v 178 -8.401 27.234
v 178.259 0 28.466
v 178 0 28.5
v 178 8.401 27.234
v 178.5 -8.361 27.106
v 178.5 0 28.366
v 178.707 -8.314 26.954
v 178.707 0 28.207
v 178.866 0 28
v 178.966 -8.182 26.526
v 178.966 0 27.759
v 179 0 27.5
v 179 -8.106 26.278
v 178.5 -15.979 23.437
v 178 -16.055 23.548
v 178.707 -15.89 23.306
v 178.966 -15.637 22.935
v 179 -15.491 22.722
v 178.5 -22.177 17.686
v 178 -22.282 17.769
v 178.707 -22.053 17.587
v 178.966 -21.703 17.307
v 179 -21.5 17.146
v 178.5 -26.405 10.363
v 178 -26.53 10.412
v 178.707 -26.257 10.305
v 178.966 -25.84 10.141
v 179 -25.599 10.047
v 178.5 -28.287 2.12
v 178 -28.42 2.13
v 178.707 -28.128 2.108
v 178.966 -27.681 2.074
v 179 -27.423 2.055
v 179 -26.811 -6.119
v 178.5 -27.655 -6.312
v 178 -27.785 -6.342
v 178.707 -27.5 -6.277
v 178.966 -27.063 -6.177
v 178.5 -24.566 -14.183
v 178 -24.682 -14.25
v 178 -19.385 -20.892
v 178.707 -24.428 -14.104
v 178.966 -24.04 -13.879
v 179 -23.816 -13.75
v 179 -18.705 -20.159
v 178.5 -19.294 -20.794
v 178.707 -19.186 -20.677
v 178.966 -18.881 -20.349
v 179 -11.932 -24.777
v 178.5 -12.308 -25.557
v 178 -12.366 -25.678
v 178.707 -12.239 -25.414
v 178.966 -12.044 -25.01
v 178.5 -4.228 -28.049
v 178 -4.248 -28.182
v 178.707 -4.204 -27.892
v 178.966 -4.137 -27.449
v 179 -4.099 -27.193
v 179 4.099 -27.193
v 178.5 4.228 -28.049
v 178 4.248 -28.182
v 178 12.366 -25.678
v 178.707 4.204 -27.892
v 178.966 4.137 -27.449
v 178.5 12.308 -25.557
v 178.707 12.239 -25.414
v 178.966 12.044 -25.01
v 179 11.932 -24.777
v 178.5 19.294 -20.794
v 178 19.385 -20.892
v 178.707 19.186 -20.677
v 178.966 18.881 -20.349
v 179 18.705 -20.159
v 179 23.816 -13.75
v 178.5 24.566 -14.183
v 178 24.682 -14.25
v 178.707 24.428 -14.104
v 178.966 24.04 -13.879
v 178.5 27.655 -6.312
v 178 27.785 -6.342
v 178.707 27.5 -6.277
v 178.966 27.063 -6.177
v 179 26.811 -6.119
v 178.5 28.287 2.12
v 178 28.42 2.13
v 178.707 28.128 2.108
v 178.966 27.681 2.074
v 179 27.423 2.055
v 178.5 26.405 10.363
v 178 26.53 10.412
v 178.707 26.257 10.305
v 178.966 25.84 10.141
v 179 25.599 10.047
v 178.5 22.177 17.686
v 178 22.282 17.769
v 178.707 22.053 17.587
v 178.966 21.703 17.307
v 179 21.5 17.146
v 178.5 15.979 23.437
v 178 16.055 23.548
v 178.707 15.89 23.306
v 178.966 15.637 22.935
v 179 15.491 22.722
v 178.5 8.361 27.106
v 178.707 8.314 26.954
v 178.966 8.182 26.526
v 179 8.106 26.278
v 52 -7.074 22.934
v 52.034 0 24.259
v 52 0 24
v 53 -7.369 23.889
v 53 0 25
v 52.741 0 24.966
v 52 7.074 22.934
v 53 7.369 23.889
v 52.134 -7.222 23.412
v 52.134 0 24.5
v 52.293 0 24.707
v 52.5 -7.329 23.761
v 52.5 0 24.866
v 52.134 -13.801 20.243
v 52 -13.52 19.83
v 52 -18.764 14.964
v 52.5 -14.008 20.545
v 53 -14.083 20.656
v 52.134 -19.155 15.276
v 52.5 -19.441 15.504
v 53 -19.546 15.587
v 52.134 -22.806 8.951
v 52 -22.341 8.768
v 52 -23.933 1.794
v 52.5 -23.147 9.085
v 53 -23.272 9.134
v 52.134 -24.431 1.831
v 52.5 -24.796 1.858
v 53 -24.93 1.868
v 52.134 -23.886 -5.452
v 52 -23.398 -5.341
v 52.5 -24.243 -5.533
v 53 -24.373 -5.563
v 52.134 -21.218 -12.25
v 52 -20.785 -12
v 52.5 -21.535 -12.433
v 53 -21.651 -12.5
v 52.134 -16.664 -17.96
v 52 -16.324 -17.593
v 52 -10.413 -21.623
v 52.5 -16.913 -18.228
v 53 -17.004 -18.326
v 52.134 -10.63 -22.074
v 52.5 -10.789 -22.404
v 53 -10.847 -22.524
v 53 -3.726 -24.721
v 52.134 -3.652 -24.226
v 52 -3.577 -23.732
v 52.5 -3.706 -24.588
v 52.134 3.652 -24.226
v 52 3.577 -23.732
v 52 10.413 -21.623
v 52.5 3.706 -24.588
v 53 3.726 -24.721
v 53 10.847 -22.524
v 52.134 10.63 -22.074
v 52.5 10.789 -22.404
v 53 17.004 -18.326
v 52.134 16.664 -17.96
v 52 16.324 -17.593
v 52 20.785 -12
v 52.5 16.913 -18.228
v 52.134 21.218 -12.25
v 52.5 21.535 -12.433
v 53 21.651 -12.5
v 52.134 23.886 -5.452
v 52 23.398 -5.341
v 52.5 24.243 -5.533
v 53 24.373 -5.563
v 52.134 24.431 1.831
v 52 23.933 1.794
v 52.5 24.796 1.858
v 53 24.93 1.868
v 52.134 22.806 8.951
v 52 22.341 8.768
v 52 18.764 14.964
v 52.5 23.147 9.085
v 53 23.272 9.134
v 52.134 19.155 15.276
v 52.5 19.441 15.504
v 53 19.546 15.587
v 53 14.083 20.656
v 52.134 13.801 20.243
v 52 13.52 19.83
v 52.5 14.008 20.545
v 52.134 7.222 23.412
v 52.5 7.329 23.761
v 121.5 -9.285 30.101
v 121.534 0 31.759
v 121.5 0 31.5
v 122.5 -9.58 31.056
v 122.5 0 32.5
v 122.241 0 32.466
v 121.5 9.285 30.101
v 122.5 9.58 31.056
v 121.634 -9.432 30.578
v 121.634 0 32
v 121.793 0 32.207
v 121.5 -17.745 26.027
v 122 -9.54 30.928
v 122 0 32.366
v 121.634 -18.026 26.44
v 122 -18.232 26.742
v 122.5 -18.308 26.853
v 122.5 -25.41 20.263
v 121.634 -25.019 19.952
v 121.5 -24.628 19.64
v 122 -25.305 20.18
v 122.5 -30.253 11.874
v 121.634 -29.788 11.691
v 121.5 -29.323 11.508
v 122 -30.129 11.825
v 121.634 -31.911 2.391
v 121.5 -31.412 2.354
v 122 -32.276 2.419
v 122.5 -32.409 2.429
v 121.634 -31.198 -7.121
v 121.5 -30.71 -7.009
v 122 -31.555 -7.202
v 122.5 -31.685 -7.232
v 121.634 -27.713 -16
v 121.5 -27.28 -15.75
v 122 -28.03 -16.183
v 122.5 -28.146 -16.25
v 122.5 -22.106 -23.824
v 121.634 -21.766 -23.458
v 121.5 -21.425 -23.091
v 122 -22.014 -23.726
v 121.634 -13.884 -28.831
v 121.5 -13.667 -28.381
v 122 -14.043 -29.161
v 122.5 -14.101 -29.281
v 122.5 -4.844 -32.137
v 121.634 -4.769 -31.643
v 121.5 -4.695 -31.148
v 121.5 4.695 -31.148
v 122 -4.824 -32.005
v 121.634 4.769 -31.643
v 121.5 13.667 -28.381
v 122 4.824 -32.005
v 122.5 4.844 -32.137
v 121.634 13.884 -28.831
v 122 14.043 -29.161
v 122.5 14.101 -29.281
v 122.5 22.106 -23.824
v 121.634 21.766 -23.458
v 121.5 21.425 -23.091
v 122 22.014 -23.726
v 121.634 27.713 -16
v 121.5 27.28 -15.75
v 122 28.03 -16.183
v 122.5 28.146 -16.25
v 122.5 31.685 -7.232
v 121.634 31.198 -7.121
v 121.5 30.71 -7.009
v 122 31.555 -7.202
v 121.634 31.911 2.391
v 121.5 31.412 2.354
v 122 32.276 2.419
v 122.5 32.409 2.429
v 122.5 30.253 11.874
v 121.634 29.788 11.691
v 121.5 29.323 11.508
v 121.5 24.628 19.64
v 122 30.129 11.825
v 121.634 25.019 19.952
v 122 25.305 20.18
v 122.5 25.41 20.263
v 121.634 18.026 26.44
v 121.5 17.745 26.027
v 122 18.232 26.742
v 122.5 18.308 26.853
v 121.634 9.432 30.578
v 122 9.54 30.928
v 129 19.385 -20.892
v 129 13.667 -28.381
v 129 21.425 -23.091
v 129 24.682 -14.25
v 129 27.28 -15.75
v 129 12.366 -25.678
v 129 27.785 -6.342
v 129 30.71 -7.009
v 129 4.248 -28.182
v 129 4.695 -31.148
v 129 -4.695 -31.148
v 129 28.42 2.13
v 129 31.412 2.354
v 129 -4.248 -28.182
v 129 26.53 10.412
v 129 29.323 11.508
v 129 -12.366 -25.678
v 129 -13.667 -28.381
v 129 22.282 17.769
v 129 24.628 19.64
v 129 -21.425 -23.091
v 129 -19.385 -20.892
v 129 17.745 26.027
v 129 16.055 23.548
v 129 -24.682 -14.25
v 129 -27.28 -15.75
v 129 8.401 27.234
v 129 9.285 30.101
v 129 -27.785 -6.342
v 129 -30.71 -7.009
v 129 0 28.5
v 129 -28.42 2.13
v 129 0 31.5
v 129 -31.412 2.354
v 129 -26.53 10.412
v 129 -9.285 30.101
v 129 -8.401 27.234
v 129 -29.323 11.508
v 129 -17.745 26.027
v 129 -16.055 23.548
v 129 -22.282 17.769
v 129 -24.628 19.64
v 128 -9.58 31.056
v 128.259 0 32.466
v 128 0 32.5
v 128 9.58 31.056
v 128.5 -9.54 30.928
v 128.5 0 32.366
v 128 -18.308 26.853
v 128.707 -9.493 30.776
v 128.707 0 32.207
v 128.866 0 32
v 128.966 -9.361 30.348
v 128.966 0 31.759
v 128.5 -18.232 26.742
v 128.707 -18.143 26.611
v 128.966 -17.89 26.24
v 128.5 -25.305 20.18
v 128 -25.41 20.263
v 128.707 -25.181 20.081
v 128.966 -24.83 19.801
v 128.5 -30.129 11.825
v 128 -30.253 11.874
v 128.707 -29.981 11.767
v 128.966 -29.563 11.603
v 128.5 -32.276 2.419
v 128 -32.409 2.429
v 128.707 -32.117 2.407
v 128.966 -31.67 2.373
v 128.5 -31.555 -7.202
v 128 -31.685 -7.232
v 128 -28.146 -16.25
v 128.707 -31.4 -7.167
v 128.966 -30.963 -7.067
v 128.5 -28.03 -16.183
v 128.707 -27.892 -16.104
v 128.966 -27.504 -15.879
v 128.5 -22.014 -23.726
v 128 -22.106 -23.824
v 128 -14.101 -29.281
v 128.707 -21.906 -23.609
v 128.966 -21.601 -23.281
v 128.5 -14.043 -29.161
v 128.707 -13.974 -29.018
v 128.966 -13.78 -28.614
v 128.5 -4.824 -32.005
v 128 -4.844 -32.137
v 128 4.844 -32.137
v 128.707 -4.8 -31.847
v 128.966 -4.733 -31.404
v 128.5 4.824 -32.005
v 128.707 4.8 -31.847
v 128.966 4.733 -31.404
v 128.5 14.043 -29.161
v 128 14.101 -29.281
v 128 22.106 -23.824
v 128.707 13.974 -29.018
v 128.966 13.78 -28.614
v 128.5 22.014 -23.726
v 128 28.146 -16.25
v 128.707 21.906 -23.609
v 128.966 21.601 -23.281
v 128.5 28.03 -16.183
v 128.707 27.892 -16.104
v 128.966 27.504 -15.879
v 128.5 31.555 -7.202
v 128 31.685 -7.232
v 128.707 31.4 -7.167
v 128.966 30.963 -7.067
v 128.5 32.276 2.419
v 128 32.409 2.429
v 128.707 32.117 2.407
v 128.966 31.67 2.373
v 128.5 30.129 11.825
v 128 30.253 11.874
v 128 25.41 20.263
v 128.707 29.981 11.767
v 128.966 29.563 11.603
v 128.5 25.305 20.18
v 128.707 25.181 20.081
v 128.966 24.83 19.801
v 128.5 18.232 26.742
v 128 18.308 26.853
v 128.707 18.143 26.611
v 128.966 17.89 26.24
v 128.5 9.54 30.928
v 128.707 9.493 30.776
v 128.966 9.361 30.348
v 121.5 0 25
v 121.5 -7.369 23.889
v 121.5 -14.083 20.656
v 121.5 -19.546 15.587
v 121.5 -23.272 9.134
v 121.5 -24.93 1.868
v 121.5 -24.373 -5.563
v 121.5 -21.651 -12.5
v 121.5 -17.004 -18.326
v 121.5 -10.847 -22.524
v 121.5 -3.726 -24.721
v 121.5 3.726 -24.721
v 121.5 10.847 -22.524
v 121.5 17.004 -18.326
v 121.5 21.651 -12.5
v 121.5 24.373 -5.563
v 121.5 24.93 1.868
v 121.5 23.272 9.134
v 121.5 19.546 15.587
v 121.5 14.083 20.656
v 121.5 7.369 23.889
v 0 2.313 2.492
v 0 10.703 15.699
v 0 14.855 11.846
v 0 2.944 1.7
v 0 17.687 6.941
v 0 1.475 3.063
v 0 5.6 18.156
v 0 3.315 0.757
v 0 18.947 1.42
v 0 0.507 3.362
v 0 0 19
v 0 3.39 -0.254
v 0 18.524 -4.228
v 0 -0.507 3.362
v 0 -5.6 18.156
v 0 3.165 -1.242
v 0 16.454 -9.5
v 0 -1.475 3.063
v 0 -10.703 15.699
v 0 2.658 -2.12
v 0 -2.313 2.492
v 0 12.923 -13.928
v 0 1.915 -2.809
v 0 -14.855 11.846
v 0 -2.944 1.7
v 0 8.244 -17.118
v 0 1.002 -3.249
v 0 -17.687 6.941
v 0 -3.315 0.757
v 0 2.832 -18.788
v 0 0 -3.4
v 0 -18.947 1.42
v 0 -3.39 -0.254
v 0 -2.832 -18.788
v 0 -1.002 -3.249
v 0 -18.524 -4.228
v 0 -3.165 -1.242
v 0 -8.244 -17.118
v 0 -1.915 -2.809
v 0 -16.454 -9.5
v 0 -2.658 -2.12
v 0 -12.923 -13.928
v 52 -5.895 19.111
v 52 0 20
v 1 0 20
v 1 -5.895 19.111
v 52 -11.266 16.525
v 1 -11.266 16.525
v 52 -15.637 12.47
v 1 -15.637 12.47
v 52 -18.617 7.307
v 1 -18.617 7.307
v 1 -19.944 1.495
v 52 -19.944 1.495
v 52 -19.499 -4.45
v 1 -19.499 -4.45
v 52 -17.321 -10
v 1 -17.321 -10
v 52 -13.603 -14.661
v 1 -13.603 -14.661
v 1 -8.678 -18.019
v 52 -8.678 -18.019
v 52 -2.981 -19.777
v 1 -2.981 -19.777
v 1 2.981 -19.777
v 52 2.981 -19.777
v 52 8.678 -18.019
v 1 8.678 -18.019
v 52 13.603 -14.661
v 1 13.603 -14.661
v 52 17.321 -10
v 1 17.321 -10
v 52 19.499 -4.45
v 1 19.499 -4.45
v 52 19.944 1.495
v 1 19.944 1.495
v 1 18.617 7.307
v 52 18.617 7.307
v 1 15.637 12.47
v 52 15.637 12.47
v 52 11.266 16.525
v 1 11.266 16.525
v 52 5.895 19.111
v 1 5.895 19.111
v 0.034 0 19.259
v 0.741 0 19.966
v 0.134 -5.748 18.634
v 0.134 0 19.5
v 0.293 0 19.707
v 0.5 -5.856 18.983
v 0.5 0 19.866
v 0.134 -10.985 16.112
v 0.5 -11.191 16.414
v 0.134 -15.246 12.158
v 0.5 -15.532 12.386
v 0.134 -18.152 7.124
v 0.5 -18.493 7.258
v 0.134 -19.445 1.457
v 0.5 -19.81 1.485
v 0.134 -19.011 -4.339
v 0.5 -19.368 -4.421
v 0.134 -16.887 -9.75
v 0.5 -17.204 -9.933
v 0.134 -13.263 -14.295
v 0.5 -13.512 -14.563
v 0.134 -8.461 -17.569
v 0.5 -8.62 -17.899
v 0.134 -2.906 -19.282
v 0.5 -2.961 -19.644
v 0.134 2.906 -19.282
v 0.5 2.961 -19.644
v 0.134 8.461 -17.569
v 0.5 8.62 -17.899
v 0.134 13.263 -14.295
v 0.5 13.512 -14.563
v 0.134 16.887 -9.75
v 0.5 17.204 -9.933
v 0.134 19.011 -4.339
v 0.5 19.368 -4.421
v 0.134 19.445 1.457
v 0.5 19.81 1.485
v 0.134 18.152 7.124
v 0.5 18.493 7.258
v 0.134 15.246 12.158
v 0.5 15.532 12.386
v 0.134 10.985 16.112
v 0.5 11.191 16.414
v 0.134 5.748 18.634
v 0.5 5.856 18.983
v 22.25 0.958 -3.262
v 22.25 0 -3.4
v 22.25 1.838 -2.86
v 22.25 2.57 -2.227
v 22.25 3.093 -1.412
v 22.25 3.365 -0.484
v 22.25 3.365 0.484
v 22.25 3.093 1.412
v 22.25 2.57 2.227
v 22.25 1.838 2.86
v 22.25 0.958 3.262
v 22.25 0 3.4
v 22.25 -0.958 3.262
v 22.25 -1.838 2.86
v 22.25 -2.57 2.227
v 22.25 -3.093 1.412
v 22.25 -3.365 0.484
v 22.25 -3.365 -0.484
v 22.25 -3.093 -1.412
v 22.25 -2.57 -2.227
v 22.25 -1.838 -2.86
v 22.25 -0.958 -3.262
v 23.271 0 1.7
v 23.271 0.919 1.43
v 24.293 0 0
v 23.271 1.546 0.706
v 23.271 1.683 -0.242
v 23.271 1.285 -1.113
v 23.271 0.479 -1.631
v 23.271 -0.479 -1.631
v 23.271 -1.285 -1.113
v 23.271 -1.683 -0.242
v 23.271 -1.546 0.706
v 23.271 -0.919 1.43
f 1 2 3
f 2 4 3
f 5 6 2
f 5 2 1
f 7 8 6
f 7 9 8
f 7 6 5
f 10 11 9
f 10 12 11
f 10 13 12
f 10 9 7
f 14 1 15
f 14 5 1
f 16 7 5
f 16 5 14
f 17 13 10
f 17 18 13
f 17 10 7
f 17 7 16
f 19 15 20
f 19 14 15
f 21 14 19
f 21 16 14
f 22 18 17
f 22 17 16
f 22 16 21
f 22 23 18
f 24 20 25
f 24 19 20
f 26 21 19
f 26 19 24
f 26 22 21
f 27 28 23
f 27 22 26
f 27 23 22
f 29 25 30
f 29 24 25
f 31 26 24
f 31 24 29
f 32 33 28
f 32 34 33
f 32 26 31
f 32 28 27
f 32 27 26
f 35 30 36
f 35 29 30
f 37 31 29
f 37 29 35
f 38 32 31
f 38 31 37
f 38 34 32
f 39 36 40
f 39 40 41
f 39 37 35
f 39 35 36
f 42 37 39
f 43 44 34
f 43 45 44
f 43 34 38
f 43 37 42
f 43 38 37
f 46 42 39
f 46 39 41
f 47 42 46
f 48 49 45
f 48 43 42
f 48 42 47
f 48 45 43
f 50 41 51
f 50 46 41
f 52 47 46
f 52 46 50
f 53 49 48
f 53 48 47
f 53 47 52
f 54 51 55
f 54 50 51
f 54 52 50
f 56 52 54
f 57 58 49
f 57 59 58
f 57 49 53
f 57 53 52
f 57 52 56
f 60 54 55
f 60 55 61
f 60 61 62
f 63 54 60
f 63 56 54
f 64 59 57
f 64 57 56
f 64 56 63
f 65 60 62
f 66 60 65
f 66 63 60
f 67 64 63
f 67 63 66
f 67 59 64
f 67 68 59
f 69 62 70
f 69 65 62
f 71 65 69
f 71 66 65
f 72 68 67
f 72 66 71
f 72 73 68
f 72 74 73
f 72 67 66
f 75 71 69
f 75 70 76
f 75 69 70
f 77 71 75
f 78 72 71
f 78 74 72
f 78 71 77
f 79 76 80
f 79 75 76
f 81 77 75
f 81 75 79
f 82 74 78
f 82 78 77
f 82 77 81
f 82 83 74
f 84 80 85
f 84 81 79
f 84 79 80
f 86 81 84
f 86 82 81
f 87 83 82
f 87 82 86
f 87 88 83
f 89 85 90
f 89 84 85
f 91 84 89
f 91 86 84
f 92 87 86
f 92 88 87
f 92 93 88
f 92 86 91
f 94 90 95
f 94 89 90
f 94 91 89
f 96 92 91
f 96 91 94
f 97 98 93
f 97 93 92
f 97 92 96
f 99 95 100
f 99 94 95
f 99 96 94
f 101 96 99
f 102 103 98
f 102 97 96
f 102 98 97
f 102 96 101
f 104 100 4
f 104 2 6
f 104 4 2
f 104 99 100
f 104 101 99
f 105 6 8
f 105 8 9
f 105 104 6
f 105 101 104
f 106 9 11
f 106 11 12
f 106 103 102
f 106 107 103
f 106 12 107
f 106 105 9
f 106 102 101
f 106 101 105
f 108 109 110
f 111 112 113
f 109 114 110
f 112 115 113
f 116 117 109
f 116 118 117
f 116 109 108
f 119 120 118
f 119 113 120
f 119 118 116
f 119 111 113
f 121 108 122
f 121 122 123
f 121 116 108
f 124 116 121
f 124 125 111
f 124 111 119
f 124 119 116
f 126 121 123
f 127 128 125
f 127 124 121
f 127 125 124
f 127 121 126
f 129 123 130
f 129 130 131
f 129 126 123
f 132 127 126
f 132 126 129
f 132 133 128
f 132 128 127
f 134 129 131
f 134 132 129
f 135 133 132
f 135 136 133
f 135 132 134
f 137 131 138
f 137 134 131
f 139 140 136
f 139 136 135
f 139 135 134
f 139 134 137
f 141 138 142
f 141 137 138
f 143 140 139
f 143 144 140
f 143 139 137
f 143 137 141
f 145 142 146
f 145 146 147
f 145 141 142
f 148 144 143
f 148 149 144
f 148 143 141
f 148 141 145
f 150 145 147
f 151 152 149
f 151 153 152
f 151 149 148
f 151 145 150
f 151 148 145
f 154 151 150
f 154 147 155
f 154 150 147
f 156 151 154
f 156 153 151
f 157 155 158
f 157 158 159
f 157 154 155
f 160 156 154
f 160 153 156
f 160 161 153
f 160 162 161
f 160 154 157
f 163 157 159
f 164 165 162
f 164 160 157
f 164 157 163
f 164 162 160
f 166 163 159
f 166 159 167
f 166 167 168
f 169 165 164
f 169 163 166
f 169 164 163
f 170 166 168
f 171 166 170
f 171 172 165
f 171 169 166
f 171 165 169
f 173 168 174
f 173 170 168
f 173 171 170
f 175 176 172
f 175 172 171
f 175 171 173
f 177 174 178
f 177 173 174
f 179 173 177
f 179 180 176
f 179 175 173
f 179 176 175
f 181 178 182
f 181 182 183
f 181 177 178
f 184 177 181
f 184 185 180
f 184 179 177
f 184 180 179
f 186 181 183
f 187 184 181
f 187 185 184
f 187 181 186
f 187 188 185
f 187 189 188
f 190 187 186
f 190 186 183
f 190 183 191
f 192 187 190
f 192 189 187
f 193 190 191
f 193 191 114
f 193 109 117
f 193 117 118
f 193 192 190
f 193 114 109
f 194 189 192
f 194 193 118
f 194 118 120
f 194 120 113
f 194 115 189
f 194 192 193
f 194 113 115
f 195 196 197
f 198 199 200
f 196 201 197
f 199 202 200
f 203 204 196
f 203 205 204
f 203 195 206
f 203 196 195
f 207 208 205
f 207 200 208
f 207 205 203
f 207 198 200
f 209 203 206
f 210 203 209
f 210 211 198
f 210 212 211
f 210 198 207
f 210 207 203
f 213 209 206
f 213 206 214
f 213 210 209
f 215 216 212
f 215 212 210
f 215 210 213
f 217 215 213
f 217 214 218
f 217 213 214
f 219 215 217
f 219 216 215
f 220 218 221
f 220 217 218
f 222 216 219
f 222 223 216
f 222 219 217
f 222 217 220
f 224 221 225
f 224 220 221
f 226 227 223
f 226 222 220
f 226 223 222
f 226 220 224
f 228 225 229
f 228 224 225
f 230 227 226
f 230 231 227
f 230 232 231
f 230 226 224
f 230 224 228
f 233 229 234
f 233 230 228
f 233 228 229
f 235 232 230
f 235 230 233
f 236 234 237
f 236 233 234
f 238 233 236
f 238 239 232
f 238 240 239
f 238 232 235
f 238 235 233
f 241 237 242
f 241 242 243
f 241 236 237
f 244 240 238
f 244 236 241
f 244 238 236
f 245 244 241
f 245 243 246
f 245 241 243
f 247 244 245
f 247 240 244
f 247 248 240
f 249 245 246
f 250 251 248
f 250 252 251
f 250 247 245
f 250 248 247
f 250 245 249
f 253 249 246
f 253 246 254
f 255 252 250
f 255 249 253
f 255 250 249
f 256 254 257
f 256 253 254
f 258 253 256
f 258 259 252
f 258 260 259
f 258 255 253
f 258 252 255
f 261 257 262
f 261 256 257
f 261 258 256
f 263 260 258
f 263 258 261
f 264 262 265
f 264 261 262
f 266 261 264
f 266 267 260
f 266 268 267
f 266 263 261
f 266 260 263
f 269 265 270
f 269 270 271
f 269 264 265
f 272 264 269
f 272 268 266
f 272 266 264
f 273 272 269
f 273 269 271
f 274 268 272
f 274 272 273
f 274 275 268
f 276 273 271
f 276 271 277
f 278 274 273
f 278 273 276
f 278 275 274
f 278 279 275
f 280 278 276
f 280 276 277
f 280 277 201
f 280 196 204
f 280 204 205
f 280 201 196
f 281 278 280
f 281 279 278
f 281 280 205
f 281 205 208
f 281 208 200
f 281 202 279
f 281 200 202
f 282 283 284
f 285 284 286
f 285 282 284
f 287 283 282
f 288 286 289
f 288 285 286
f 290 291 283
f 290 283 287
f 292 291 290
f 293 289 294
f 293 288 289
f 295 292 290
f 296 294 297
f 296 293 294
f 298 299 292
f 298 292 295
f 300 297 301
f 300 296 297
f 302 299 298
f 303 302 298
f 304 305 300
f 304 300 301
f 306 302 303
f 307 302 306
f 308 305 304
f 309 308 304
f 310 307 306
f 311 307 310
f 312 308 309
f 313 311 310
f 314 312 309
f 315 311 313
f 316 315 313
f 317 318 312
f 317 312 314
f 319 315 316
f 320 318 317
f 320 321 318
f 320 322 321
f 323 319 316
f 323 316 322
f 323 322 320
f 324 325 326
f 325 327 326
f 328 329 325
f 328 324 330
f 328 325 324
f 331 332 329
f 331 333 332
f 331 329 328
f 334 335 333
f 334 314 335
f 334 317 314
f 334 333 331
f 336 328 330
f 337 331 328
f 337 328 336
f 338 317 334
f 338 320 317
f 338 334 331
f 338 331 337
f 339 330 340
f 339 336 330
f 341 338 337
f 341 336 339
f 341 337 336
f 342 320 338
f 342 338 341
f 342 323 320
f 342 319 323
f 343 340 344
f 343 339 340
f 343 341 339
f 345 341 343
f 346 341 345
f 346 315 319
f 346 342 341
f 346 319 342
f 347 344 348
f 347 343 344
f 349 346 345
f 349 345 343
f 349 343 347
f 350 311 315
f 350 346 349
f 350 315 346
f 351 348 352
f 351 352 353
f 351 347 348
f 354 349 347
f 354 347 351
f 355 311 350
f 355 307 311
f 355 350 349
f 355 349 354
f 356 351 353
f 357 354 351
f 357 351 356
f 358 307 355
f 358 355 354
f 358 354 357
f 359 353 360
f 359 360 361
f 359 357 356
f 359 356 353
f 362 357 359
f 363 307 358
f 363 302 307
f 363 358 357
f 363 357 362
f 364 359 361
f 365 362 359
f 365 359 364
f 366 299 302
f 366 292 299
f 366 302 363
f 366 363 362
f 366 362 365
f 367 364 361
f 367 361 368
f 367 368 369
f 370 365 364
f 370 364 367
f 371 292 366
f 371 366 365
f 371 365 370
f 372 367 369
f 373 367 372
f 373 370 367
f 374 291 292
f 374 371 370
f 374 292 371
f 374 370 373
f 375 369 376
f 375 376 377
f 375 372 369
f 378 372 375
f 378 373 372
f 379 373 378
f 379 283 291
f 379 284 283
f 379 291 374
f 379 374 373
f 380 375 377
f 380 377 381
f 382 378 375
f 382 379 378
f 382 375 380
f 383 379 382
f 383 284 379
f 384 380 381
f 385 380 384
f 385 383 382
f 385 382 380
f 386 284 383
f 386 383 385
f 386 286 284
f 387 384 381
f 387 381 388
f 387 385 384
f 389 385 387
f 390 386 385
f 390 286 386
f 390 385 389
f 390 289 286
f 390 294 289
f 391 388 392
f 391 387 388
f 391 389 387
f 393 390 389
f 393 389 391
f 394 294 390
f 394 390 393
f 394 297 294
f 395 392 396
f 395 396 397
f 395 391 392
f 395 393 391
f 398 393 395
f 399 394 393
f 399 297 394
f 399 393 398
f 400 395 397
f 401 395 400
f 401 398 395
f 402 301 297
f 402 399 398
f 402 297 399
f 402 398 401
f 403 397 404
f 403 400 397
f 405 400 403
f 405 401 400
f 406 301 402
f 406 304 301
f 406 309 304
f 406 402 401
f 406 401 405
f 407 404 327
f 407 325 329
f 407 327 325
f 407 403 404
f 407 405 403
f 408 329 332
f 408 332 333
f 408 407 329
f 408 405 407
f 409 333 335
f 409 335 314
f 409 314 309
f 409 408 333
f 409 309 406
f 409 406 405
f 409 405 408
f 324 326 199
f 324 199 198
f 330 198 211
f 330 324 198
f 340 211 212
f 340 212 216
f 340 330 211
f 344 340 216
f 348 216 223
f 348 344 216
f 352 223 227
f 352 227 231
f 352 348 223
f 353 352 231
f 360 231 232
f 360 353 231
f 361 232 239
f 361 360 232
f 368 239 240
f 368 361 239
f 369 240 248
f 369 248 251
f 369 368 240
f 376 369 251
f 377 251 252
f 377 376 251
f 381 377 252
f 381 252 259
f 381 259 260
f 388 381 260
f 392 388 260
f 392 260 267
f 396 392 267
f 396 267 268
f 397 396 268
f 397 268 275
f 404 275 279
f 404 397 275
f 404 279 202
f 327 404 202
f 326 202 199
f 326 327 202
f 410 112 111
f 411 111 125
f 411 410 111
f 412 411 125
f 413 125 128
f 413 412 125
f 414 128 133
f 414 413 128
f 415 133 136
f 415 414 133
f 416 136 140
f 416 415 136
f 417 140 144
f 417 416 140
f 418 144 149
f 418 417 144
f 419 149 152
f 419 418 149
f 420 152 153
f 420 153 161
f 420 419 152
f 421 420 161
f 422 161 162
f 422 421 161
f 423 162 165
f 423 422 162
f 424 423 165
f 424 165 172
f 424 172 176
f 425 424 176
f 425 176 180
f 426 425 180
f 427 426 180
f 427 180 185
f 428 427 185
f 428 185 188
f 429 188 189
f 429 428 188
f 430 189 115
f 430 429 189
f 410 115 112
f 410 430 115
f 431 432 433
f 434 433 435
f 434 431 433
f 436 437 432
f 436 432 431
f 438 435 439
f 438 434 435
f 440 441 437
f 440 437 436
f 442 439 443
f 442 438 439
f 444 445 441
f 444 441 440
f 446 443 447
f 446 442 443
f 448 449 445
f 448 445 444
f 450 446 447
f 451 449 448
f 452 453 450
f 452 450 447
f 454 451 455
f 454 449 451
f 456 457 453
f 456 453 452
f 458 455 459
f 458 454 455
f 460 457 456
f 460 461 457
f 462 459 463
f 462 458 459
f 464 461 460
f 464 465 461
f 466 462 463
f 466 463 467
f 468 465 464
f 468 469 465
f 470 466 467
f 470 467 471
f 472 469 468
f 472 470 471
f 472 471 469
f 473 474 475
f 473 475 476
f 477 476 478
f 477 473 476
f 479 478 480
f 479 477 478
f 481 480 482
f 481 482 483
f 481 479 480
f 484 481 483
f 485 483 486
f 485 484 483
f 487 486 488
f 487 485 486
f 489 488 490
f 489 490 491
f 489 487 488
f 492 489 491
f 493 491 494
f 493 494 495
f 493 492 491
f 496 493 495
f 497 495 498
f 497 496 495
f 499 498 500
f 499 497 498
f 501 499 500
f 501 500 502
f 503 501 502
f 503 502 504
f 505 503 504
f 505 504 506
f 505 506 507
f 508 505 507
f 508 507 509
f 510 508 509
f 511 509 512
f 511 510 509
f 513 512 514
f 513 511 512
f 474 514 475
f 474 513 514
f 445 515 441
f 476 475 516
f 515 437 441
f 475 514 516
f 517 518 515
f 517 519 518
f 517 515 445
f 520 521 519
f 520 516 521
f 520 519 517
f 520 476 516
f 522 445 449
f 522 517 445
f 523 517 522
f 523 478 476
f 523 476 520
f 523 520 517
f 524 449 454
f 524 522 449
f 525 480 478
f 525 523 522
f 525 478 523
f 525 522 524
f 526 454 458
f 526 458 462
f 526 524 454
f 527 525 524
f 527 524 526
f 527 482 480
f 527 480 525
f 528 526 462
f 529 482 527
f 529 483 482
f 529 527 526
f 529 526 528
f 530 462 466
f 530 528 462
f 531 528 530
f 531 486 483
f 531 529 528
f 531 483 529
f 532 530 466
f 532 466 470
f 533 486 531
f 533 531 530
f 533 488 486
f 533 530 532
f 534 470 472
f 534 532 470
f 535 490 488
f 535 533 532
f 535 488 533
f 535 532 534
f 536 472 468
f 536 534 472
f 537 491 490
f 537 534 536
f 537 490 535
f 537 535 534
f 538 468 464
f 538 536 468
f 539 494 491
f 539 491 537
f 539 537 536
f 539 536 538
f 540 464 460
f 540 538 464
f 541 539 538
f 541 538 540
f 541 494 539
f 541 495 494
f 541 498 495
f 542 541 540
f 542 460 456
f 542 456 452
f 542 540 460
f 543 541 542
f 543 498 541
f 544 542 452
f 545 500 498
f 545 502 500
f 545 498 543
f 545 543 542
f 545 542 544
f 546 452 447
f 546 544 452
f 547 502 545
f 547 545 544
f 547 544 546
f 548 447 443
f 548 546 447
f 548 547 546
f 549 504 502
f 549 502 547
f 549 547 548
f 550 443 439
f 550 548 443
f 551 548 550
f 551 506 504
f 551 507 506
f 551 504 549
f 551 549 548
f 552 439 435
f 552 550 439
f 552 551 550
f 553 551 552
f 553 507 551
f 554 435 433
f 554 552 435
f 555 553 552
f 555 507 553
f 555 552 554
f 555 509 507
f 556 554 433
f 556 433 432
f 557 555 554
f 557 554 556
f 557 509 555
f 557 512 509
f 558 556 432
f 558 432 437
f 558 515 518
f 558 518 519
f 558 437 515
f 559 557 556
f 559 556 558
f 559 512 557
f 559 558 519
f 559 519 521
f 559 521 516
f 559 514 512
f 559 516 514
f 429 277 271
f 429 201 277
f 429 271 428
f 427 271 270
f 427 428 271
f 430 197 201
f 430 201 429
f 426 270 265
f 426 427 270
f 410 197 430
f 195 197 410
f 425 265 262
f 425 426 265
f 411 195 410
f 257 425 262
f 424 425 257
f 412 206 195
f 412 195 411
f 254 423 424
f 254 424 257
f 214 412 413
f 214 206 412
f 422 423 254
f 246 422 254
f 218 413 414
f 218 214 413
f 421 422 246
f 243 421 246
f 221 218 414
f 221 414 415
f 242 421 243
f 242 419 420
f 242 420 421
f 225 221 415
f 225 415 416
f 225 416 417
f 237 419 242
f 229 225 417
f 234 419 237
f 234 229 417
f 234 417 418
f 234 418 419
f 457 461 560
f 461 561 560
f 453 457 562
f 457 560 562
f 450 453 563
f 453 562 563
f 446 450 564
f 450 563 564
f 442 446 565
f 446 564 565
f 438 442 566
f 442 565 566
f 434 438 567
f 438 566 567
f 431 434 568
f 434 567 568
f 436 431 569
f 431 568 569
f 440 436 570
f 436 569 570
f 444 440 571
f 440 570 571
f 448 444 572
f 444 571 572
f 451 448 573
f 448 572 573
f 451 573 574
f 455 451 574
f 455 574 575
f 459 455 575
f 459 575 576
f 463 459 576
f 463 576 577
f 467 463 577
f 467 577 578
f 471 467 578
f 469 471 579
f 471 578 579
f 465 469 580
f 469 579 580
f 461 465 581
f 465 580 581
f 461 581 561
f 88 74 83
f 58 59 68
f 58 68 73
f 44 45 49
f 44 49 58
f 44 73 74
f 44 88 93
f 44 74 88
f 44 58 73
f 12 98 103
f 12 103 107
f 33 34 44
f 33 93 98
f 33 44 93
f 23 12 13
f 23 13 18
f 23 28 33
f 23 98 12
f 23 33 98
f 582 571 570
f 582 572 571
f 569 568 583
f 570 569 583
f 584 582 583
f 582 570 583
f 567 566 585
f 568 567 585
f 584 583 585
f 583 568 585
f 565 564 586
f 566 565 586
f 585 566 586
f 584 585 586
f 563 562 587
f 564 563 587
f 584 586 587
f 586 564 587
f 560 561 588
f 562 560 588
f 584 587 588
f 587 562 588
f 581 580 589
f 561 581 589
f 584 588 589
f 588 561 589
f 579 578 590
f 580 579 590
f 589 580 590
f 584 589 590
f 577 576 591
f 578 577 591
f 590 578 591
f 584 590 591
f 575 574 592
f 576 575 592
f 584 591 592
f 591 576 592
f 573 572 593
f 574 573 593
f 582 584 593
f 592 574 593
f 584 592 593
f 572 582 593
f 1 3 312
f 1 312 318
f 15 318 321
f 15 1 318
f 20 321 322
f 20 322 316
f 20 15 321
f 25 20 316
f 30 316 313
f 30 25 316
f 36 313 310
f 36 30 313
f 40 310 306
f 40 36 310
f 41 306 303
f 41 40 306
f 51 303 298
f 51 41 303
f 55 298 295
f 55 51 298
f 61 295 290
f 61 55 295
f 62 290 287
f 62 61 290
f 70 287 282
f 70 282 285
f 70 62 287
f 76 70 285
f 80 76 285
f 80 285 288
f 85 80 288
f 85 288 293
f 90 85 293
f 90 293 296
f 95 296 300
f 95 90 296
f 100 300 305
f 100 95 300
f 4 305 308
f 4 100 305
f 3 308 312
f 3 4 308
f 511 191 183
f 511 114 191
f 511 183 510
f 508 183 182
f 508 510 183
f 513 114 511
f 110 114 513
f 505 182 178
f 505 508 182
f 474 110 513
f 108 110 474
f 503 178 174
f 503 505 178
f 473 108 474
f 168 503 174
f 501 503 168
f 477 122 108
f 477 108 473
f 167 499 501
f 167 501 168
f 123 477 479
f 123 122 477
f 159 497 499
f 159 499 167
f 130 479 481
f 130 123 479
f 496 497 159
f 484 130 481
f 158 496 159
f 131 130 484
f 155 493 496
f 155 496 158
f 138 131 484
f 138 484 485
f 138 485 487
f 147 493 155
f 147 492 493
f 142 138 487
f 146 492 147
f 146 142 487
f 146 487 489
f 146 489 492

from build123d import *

# Parameters (mm, degrees)
HOLE_WIZARD_M81_D     = 6.8
HOLE_WIZARD_M81_DEPTH = 22.25
HOLE_WIZARD_M81_TIP   = 2.042926105
FILLET_1_R            = 1


with BuildPart() as part:
    # Эскиз1 → Повернуть1 (revolve)
    with BuildSketch(Plane.XY, mode=Mode.PRIVATE) as revolve_1_sk:
        Polygon((0, 0), (0, 20), (52, 20), (52, 25), (121.5, 25), (121.5, 32.5), (129, 32.5), (129, 28.5), (179, 28.5), (179, 0), align=None)
    revolve(revolve_1_sk.sketch.rotate(Axis((0, 0, 0), (1, 0, 0)), 90), axis=Axis((0, 0, 0), (1, 0, 0)))

    # Отверстие обработанное метчиком M81
    with Locations(Plane.ZY):
        with Locations((0, 0)):
            Hole(HOLE_WIZARD_M81_D / 2, depth=HOLE_WIZARD_M81_DEPTH)
            with Locations((0, 0, -(HOLE_WIZARD_M81_DEPTH + HOLE_WIZARD_M81_TIP / 2))):  # 118° drill point
                Cone(0, HOLE_WIZARD_M81_D / 2, HOLE_WIZARD_M81_TIP, mode=Mode.SUBTRACT)

    # Скругление1
    fillet_1_edges = [part.edges().sort_by_distance(p)[0] for p in [
        (52, 0, -25),
        (0, 0, -20),
        (179, 0, -28.5),
        (129, 0, -32.5),
        (121.5, 0, -32.5),
    ]]
    fillet(fillet_1_edges, radius=FILLET_1_R)


solid = part.part
